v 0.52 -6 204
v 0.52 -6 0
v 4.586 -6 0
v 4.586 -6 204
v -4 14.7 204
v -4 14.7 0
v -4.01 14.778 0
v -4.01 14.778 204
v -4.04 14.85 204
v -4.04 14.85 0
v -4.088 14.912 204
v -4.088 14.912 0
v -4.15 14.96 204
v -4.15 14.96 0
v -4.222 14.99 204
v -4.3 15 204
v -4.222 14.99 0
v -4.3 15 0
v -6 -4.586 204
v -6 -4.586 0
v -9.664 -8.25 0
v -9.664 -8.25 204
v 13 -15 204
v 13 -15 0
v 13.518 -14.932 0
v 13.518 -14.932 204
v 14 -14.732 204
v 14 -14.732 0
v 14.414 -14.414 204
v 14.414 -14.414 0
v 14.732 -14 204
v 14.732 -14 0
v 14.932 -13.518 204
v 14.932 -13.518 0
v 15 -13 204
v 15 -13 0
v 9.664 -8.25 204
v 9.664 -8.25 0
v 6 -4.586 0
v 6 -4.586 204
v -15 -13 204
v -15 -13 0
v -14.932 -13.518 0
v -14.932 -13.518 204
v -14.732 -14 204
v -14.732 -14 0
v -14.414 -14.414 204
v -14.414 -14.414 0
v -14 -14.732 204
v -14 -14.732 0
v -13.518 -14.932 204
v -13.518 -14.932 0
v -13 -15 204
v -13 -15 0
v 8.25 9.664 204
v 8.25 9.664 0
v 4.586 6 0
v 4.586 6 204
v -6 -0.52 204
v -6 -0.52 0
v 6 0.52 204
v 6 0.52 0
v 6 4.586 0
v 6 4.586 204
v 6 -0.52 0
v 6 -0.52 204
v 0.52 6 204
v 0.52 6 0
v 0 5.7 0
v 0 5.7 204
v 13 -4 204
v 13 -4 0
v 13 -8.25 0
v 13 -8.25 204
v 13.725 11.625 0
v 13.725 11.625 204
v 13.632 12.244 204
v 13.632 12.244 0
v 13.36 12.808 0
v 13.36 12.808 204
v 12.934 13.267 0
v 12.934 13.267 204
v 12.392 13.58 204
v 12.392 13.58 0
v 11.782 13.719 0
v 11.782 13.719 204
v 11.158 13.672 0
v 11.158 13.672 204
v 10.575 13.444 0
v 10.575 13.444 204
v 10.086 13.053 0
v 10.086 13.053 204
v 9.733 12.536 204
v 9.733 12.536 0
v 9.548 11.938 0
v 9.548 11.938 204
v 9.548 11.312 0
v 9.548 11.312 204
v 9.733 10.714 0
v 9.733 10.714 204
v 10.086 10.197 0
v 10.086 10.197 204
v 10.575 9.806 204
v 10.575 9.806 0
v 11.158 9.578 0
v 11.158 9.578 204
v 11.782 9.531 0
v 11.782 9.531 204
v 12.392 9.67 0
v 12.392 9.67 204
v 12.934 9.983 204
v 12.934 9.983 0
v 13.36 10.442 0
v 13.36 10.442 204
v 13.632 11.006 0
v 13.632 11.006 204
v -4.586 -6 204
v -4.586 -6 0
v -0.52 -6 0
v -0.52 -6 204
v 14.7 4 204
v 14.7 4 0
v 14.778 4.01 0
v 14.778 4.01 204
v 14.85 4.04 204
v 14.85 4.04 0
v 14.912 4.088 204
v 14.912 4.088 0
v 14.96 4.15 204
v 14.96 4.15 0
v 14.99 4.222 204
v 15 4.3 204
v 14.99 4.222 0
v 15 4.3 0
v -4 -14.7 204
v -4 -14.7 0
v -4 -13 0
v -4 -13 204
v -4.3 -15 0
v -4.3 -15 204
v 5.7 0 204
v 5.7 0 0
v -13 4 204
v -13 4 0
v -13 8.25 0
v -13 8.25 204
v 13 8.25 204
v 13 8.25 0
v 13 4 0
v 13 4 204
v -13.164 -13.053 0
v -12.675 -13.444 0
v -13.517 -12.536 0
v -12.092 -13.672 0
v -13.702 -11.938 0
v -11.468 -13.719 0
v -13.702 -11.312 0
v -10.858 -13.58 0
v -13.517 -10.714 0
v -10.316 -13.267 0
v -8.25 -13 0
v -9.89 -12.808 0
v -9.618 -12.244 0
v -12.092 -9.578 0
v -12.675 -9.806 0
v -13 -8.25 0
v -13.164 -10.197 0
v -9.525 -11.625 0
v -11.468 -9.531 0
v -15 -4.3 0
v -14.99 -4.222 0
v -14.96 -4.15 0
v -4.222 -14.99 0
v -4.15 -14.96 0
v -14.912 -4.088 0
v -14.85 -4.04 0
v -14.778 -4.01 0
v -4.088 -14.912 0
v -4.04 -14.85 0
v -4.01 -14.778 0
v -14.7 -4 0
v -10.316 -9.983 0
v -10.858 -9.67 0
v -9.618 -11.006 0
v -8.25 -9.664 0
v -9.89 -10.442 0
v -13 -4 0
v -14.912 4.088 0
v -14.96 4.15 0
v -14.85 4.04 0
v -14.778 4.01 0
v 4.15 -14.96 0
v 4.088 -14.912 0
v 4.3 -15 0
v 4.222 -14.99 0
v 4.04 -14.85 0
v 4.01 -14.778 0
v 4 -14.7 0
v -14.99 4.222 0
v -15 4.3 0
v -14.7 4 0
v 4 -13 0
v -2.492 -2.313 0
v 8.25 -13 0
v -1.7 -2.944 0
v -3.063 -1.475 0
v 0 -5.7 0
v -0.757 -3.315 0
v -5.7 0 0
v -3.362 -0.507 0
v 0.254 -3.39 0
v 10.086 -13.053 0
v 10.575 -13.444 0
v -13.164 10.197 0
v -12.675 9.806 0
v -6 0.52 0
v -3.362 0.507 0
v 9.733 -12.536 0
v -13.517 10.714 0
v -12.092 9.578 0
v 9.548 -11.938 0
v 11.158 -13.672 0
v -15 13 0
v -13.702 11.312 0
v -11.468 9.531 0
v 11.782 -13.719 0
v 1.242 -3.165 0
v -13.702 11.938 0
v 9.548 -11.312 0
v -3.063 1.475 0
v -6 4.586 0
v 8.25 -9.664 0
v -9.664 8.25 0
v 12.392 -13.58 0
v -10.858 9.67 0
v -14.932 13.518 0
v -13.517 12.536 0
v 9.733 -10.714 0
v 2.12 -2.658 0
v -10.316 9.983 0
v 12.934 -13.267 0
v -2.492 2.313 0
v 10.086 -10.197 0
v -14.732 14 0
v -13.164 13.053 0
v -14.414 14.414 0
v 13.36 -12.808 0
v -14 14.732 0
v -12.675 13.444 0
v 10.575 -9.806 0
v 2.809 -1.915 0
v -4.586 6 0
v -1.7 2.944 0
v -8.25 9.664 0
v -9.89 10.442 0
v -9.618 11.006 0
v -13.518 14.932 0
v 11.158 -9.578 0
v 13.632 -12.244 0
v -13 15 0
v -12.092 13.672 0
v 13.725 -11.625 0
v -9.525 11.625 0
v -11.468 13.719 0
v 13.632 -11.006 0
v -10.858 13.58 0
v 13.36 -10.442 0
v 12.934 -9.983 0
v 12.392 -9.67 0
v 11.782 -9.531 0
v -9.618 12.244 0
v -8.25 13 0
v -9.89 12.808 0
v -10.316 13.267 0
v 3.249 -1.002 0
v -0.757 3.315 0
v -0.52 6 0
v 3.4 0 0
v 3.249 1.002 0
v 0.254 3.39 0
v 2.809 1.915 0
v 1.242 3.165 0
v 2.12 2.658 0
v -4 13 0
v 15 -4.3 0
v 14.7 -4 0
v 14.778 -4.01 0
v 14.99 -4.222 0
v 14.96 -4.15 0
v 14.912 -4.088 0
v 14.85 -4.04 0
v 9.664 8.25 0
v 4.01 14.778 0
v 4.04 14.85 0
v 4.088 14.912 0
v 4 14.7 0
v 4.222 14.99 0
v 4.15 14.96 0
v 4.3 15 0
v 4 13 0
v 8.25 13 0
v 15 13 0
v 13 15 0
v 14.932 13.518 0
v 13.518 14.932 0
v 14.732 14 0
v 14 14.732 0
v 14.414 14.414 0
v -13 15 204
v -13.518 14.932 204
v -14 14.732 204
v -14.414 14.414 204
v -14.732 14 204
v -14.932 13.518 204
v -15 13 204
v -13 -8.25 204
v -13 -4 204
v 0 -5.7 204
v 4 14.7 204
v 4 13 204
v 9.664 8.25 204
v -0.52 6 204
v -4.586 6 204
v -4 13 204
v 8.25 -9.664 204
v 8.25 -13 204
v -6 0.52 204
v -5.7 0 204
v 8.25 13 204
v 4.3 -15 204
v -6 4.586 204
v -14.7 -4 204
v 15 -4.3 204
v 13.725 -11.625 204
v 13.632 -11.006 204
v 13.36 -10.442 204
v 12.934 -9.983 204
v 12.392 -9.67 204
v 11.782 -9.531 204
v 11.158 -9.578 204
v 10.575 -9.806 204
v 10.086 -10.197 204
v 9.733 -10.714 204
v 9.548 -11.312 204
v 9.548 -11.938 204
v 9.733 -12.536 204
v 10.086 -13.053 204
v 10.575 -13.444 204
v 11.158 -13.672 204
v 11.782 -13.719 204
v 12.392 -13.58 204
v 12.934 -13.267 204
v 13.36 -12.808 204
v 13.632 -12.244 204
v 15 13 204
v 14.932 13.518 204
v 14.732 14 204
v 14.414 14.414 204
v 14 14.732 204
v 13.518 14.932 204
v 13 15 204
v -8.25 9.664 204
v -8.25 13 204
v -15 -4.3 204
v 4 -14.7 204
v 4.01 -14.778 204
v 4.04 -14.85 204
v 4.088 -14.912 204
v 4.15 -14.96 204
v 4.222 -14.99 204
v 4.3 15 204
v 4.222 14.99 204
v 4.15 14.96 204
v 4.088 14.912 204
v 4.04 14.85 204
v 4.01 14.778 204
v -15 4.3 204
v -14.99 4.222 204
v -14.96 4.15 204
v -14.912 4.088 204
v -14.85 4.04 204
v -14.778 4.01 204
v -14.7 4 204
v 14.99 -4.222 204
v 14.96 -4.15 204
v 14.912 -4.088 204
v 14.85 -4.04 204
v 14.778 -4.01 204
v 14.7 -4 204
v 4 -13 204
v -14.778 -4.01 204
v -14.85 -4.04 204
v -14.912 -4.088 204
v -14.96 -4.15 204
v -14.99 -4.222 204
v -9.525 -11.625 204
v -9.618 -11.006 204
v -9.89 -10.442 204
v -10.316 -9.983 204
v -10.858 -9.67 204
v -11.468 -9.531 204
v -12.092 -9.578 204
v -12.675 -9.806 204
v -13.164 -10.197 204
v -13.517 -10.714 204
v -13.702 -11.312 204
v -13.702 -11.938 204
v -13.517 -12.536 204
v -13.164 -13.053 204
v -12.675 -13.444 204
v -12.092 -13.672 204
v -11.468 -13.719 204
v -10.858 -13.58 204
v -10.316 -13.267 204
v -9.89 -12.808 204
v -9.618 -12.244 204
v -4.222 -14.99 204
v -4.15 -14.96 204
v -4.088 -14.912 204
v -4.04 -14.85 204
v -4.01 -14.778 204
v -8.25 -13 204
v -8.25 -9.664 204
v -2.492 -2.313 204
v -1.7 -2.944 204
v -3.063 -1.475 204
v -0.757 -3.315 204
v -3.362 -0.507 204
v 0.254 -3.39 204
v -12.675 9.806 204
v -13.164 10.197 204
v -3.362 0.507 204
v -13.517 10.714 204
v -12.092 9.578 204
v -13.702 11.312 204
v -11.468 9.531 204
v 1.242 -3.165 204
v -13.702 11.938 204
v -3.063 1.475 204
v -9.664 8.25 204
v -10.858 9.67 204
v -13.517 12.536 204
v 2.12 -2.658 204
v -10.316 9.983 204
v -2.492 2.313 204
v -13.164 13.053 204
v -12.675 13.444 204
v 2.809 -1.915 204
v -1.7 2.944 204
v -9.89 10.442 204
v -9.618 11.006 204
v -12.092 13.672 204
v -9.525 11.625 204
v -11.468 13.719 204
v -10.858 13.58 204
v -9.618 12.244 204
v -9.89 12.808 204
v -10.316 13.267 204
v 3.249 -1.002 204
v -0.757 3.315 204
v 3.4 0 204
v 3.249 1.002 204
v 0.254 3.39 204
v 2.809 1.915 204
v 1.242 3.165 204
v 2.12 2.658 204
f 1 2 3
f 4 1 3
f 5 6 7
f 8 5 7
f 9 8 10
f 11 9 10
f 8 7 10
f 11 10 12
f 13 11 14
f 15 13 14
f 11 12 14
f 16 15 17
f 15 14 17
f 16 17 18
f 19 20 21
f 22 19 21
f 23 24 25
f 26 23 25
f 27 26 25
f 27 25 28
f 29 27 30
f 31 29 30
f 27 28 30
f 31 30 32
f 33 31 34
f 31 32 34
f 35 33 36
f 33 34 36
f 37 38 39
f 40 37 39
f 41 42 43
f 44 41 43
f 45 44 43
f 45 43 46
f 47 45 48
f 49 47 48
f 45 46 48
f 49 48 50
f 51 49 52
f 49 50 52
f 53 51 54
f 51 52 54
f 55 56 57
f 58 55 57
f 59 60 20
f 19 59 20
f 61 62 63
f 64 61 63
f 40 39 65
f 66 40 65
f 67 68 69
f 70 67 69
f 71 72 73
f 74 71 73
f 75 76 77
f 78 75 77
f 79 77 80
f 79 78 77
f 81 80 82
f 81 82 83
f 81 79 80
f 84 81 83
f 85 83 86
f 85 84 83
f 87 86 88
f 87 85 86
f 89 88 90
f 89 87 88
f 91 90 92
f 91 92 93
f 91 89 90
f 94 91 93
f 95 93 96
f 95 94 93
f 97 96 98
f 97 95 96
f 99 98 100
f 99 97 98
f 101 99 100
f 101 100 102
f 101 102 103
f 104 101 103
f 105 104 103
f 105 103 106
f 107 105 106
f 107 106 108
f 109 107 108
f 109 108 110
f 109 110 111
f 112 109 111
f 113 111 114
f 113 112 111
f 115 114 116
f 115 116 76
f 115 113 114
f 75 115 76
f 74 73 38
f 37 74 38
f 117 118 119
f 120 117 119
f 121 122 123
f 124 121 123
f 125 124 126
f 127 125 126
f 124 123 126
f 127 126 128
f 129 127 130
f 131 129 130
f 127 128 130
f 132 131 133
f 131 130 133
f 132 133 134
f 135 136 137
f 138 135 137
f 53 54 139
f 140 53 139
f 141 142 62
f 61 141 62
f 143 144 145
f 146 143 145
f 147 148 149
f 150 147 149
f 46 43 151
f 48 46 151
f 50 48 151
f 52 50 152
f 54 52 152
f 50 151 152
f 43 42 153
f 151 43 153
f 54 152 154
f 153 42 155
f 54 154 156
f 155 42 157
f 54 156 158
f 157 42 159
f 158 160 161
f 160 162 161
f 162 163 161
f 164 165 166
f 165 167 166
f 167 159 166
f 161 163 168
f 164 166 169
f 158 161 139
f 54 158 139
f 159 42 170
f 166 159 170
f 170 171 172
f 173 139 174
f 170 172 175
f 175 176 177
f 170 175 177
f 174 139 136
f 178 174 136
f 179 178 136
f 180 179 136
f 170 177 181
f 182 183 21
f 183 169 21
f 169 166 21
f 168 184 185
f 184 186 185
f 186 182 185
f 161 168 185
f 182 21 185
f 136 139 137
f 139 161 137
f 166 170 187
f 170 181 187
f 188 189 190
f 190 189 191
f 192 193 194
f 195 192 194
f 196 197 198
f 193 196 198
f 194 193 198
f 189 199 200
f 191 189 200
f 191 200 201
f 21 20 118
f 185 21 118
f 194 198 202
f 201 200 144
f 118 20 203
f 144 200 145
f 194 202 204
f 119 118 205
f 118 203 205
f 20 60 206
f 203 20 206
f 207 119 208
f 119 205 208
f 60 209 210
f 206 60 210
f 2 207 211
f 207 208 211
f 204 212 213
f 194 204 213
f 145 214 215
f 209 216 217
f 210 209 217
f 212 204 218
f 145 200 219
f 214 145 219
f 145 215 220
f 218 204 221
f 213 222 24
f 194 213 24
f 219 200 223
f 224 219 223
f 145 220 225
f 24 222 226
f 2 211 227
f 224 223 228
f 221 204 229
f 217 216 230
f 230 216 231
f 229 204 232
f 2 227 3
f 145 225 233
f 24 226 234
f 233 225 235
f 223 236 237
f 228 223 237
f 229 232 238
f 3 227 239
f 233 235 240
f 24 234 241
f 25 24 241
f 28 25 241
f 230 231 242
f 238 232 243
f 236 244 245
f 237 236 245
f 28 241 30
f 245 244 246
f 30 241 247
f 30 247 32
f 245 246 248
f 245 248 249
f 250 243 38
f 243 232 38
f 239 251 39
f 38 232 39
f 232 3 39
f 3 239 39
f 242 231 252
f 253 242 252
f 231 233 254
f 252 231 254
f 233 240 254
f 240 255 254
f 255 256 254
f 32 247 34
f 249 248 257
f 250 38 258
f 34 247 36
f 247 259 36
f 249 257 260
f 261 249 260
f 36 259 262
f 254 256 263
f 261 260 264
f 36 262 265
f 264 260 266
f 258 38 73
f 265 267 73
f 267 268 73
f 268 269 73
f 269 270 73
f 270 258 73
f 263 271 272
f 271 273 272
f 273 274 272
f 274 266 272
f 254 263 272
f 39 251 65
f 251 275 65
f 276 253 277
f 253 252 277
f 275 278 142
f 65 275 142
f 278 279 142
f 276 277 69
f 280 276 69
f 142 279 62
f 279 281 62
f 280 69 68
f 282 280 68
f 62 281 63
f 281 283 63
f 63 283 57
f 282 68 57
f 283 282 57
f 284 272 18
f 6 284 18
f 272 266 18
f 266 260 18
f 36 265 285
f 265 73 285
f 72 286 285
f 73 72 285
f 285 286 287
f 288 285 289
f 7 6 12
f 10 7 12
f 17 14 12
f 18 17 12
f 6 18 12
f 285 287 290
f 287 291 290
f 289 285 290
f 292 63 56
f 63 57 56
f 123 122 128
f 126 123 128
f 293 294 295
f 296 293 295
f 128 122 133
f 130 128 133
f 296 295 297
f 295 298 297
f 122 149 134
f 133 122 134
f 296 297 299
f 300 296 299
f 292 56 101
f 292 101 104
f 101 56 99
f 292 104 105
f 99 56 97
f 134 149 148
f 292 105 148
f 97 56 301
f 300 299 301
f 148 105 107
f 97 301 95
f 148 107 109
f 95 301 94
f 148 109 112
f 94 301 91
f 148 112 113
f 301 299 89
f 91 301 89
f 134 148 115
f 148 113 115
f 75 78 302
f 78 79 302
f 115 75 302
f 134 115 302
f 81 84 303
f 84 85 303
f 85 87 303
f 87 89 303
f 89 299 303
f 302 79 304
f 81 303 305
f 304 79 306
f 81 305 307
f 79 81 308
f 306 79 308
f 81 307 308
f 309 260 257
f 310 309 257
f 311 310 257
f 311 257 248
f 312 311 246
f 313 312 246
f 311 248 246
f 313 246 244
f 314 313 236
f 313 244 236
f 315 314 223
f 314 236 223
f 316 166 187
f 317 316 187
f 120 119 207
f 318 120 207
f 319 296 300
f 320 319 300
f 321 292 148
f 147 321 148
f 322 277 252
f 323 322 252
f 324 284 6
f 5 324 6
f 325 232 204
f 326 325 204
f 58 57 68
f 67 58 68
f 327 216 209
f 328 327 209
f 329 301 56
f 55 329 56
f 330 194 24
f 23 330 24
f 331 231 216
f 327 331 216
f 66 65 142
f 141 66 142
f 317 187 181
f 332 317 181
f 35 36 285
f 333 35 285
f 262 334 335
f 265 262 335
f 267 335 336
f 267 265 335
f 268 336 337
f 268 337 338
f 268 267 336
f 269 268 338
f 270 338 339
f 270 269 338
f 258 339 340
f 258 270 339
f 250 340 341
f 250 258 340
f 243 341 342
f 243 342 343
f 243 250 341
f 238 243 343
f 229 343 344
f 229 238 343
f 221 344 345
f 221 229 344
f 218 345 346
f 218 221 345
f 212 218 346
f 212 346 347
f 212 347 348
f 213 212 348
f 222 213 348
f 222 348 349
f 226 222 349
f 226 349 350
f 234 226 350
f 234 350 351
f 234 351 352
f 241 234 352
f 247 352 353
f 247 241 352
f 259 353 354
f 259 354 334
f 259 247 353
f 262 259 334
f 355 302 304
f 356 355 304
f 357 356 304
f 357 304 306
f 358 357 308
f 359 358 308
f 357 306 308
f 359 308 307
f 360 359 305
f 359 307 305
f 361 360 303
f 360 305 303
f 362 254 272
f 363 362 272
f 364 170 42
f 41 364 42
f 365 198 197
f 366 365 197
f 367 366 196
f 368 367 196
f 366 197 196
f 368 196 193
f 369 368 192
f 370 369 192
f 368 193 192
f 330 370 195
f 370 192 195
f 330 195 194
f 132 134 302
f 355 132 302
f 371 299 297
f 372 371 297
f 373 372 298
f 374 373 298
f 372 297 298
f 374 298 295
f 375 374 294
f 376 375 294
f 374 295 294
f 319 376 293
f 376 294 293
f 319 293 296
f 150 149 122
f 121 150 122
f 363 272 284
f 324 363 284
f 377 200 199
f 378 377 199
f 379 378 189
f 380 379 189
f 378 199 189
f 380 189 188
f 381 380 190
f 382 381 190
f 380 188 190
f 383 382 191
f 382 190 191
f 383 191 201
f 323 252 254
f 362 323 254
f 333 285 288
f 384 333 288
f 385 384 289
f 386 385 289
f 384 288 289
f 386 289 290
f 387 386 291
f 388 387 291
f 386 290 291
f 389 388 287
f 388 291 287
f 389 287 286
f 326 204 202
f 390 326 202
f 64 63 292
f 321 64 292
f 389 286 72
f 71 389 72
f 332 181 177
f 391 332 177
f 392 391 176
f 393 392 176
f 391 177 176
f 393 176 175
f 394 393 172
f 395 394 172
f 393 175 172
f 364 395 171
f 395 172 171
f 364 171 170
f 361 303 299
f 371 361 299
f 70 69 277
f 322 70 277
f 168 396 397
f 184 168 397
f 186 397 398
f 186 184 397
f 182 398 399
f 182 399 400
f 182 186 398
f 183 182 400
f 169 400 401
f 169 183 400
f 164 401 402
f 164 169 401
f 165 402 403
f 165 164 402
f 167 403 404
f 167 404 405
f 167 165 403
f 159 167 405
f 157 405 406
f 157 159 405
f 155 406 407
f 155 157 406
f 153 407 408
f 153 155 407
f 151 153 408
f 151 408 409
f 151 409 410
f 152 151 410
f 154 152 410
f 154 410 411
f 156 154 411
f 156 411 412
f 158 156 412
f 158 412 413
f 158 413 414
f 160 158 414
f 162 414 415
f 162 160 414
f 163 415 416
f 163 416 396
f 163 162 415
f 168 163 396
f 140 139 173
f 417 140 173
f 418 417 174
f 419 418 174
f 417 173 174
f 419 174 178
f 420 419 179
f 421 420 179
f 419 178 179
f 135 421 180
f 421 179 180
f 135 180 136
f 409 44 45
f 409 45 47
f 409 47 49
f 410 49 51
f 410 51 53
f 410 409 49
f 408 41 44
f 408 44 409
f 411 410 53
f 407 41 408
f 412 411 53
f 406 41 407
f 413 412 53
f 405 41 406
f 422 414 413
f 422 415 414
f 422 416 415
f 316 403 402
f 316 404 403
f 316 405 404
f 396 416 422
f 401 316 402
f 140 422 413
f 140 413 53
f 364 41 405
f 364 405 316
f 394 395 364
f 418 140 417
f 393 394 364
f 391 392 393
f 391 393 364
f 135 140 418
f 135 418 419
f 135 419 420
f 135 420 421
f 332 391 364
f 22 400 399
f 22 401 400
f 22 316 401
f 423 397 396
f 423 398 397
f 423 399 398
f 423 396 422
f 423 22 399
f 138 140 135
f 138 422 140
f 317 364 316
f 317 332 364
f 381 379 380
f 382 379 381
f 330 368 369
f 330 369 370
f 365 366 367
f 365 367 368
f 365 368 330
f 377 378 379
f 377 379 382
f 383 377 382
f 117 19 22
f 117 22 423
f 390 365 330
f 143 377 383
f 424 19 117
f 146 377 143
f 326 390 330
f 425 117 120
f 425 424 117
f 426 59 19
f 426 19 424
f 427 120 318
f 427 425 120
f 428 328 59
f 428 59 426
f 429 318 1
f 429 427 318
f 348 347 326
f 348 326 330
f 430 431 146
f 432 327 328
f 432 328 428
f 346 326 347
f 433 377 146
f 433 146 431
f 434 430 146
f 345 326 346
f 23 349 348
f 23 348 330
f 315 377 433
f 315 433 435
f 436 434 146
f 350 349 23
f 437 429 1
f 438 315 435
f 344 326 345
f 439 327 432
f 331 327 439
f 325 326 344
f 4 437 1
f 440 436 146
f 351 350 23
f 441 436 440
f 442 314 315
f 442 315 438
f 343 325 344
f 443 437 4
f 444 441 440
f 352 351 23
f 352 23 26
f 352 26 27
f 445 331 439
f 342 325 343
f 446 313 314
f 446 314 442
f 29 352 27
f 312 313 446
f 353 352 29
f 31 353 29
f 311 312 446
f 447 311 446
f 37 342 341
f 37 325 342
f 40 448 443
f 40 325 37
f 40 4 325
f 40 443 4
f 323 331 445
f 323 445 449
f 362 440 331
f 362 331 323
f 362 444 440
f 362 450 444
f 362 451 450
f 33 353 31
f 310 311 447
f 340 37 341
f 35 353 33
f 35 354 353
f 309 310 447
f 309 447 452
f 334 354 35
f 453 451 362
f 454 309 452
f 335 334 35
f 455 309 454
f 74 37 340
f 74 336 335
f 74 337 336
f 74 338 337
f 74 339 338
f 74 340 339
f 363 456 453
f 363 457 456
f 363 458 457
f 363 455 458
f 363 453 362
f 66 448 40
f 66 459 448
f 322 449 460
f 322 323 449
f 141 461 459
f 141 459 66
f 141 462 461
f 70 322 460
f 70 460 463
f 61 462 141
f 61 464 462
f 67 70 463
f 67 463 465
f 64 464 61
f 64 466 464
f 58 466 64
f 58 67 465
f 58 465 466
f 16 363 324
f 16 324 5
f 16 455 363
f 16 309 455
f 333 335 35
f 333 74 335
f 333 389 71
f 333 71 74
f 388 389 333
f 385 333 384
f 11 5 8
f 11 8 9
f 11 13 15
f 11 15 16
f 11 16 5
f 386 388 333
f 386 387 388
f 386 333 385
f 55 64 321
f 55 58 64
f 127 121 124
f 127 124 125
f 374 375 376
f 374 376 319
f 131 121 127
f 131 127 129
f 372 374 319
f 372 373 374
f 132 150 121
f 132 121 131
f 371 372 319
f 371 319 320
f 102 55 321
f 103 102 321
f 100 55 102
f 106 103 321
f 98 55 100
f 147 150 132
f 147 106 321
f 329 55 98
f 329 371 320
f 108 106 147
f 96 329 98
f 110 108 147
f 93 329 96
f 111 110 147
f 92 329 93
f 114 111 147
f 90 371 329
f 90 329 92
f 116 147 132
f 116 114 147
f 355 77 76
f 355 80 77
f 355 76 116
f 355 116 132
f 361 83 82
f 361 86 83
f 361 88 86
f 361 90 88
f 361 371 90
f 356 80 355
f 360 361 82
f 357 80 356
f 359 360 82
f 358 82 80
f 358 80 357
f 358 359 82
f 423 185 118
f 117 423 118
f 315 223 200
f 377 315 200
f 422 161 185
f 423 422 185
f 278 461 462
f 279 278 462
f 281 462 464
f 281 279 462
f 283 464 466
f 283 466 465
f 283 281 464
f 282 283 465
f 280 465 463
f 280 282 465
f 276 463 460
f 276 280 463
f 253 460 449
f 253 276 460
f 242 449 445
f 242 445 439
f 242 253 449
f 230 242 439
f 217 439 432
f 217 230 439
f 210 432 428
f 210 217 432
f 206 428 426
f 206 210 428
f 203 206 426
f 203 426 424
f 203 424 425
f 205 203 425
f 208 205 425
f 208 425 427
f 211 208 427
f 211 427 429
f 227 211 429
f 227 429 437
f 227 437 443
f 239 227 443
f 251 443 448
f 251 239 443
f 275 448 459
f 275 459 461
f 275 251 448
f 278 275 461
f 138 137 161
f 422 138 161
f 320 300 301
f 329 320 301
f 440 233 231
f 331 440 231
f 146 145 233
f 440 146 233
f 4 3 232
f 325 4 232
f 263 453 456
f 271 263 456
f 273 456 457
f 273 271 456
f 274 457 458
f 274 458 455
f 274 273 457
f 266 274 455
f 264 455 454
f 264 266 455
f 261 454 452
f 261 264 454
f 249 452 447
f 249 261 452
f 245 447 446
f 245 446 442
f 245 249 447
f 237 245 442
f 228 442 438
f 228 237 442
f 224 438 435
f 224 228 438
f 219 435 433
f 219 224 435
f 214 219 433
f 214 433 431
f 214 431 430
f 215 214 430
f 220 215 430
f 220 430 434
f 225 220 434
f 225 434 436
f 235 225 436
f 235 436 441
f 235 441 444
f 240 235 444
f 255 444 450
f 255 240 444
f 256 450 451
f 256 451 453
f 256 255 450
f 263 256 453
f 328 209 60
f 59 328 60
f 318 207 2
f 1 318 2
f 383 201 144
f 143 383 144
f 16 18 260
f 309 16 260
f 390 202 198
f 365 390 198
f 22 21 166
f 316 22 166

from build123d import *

# Parameters (mm, degrees)
SKETCH1_R           = 2.1
SKETCH1_R_2         = 3.4
BOSS_EXTRUDE1_DEPTH = 204


with BuildPart() as part:
    # Sketch1 → Boss-Extrude1 (new body)
    with BuildSketch(Plane.XY):
        with BuildLine():
            Line((-14.7, 4), (-13, 4))
            Line((-13, 4), (-13, 8.25))
            Line((-13, 8.25), (-9.664213562, 8.25))
            Line((-9.664213562, 8.25), (-6, 4.585786438))
            Line((-6, 4.585786438), (-6, 0.519615242))
            Line((-6, 0.519615242), (-5.7, 0))
            Line((-5.7, 0), (-6, -0.519615242))
            Line((-6, -0.519615242), (-6, -4.585786438))
            Line((-6, -4.585786438), (-9.664213562, -8.25))
            Line((-9.664213562, -8.25), (-13, -8.25))
            Line((-13, -8.25), (-13, -4))
            Line((-13, -4), (-14.7, -4))
            ThreePointArc((-14.7, -4), (-14.912132034, -4.087867966), (-15, -4.3))
            Line((-15, -4.3), (-15, -13))
            ThreePointArc((-15, -13), (-14.414213562, -14.414213562), (-13, -15))
            Line((-13, -15), (-4.3, -15))
            ThreePointArc((-4.3, -15), (-4.087867966, -14.912132034), (-4, -14.7))
            Line((-4, -14.7), (-4, -13))
            Line((-4, -13), (-8.25, -13))
            Line((-8.25, -13), (-8.25, -9.664213562))
            Line((-8.25, -9.664213562), (-4.585786438, -6))
            Line((-4.585786438, -6), (-0.519615242, -6))
            Line((-0.519615242, -6), (0, -5.7))
            Line((0, -5.7), (0.519615242, -6))
            Line((0.519615242, -6), (4.585786438, -6))
            Line((4.585786438, -6), (8.25, -9.664213562))
            Line((8.25, -9.664213562), (8.25, -13))
            Line((8.25, -13), (4, -13))
            Line((4, -13), (4, -14.7))
            ThreePointArc((4, -14.7), (4.087867966, -14.912132034), (4.3, -15))
            Line((4.3, -15), (13, -15))
            ThreePointArc((13, -15), (14.414213562, -14.414213562), (15, -13))
            Line((15, -13), (15, -4.3))
            ThreePointArc((15, -4.3), (14.912132034, -4.087867966), (14.7, -4))
            Line((14.7, -4), (13, -4))
            Line((13, -4), (13, -8.25))
            Line((13, -8.25), (9.664213562, -8.25))
            Line((9.664213562, -8.25), (6, -4.585786438))
            Line((6, -4.585786438), (6, -0.519615242))
            Line((6, -0.519615242), (5.7, 0))
            Line((5.7, 0), (6, 0.519615242))
            Line((6, 0.519615242), (6, 4.585786438))
            Line((6, 4.585786438), (9.664213562, 8.25))
            Line((9.664213562, 8.25), (13, 8.25))
            Line((13, 8.25), (13, 4))
            Line((13, 4), (14.7, 4))
            ThreePointArc((14.7, 4), (14.912132034, 4.087867966), (15, 4.3))
            Line((15, 4.3), (15, 13))
            ThreePointArc((15, 13), (14.414213562, 14.414213562), (13, 15))
            Line((13, 15), (4.3, 15))
            ThreePointArc((4.3, 15), (4.087867966, 14.912132034), (4, 14.7))
            Line((4, 14.7), (4, 13))
            Line((4, 13), (8.25, 13))
            Line((8.25, 13), (8.25, 9.664213562))
            Line((8.25, 9.664213562), (4.585786438, 6))
            Line((4.585786438, 6), (0.519615242, 6))
            Line((0.519615242, 6), (0, 5.7))
            Line((0, 5.7), (-0.519615242, 6))
            Line((-0.519615242, 6), (-4.585786438, 6))
            Line((-4.585786438, 6), (-8.25, 9.664213562))
            Line((-8.25, 9.664213562), (-8.25, 13))
            Line((-8.25, 13), (-4, 13))
            Line((-4, 13), (-4, 14.7))
            ThreePointArc((-4, 14.7), (-4.087867966, 14.912132034), (-4.3, 15))
            Line((-4.3, 15), (-13, 15))
            ThreePointArc((-13, 15), (-14.414213562, 14.414213562), (-15, 13))
            Line((-15, 13), (-15, 4.3))
            ThreePointArc((-15, 4.3), (-14.912132034, 4.087867966), (-14.7, 4))
        make_face()
        with Locations((11.625, 11.625)):
            Circle(SKETCH1_R, mode=Mode.SUBTRACT)
        with Locations((11.625, -11.625)):
            Circle(SKETCH1_R, mode=Mode.SUBTRACT)
        Circle(SKETCH1_R_2, mode=Mode.SUBTRACT)
        with Locations((-11.625, -11.625)):
            Circle(SKETCH1_R, mode=Mode.SUBTRACT)
        with Locations((-11.625, 11.625)):
            Circle(SKETCH1_R, mode=Mode.SUBTRACT)
    extrude(amount=BOSS_EXTRUDE1_DEPTH)


solid = part.part
